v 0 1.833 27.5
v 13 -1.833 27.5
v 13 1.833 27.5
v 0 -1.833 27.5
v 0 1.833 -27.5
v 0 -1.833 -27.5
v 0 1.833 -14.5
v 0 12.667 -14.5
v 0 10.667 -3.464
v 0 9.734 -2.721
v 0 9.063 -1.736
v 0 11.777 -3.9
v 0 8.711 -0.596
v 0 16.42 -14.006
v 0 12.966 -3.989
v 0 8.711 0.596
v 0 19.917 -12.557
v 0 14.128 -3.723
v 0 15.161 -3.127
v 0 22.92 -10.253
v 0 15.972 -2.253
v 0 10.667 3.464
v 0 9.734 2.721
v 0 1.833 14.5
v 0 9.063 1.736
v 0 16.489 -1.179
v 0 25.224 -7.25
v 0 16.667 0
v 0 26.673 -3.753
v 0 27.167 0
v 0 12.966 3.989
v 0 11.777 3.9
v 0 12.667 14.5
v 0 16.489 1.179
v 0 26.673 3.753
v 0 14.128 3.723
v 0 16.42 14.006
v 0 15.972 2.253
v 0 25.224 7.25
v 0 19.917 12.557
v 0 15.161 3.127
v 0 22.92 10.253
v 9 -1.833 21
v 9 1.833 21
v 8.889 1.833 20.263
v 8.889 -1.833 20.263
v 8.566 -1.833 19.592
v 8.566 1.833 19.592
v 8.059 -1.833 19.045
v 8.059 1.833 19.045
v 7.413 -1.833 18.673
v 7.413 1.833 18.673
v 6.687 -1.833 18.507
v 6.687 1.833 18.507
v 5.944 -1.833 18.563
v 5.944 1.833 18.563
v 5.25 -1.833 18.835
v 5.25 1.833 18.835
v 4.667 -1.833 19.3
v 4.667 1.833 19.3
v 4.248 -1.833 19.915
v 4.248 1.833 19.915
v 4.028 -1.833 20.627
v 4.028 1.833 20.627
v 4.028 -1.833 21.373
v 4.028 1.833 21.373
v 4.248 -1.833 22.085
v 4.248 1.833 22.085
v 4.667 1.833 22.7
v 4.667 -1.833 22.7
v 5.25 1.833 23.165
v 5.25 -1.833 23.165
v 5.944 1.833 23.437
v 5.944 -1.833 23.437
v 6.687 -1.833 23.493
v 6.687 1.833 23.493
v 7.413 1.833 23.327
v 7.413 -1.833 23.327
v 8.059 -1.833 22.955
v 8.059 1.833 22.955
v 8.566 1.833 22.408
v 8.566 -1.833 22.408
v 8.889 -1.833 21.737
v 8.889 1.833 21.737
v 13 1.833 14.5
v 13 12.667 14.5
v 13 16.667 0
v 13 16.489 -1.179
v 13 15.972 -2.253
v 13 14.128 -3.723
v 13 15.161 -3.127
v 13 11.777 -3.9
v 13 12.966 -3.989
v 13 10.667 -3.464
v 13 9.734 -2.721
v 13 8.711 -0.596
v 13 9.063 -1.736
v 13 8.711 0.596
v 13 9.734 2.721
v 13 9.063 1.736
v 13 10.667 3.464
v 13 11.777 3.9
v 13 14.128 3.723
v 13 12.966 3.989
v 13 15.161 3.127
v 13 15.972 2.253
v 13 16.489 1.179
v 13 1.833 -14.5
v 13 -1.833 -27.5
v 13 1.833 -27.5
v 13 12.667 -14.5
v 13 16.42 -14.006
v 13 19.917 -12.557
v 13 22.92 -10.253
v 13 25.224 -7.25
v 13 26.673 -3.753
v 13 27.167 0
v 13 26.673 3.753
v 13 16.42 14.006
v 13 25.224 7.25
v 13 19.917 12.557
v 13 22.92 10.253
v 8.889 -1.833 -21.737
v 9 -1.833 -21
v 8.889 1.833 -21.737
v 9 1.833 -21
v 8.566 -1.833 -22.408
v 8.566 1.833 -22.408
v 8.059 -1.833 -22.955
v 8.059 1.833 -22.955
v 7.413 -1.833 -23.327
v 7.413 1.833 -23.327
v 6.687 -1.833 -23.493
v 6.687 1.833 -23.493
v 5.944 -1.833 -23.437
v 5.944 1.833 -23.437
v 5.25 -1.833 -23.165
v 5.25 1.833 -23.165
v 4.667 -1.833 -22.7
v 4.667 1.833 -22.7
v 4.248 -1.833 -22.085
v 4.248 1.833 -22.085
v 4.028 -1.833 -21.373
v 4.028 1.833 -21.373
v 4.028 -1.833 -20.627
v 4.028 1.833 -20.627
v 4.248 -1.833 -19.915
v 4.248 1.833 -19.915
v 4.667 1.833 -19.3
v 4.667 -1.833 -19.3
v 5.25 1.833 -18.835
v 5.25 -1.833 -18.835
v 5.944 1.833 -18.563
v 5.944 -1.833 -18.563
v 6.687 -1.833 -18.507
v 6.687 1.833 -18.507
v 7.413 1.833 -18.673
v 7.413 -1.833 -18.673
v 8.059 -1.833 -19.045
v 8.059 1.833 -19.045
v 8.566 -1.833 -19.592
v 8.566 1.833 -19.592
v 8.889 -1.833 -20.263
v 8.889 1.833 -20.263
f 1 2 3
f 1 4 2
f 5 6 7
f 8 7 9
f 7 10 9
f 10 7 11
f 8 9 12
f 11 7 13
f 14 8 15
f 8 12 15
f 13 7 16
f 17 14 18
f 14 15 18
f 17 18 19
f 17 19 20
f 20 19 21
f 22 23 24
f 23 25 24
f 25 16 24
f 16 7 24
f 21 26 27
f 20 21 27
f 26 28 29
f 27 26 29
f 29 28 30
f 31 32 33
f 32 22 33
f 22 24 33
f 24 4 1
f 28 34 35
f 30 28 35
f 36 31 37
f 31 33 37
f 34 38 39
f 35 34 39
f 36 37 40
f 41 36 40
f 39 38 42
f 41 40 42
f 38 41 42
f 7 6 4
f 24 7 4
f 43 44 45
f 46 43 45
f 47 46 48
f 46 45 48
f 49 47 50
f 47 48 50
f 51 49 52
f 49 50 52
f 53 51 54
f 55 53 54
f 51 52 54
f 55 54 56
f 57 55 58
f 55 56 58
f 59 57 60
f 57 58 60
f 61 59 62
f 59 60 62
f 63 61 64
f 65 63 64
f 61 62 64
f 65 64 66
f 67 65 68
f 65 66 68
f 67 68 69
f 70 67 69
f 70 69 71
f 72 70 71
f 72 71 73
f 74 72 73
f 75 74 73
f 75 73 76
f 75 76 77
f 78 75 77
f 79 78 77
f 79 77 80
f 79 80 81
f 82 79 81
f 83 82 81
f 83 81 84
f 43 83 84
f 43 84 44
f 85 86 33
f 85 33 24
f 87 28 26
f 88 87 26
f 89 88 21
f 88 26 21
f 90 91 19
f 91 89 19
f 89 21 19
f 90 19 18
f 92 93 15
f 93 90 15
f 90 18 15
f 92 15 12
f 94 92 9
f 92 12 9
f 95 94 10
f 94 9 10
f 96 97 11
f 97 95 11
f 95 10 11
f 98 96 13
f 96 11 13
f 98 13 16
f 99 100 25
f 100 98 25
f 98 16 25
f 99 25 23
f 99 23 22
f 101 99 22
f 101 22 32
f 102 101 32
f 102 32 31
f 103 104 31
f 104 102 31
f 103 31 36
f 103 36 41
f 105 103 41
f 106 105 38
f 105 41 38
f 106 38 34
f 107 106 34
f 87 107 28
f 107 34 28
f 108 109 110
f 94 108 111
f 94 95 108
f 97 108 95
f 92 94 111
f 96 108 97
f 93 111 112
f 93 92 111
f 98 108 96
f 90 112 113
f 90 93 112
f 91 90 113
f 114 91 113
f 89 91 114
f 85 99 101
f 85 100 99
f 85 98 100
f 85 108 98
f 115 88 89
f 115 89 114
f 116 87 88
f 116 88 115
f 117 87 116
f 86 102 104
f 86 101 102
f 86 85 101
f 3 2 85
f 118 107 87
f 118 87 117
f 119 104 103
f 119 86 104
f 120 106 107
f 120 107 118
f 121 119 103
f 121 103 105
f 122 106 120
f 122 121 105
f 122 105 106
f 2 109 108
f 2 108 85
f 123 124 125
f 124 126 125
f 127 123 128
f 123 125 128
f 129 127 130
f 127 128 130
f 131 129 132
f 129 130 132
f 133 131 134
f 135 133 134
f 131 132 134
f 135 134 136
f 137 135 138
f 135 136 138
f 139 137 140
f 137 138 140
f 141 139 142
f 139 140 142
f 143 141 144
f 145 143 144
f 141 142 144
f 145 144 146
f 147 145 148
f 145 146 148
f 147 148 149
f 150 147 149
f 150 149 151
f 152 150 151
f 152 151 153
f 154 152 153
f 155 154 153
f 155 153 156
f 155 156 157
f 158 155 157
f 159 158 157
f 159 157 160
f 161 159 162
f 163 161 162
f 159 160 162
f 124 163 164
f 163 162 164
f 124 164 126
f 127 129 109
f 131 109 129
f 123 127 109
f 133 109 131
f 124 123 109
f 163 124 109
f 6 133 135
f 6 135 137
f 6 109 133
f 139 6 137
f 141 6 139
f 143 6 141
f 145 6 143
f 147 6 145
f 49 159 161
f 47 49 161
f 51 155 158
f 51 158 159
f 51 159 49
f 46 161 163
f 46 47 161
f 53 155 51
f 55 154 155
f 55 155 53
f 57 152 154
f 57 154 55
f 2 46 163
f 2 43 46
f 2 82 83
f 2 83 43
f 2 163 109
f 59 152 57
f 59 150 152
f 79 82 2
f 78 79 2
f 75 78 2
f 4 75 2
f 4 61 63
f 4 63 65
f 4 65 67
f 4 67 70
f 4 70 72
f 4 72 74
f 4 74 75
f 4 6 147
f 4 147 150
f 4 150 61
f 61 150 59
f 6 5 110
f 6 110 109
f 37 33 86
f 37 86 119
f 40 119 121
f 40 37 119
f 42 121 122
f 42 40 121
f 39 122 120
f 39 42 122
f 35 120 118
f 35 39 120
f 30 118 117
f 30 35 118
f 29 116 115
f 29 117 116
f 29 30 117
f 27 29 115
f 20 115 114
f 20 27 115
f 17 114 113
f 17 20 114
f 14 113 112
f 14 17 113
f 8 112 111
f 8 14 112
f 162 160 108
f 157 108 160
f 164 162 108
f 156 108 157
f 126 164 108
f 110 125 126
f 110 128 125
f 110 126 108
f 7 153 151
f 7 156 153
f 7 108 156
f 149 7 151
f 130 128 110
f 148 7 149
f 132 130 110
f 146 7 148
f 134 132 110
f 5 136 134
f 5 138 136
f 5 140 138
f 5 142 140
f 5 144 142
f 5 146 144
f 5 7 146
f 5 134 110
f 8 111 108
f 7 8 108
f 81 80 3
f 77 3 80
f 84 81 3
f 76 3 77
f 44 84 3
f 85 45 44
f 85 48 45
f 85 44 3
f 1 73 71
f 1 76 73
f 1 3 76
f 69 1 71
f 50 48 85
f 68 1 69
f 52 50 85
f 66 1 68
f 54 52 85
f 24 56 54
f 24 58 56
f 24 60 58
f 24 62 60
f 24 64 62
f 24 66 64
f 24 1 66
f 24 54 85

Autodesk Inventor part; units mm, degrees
ref_plane "YZ Plane" through (0, 0, 0) normal (1, 0, 0) x (0, 1, 0)
ref_plane "XZ Plane" through (0, 0, 0) normal (0, 1, 0) x (-1, 0, 0)
ref_plane "XY Plane" through (0, 0, 0) normal (0, 0, 1) x (1, 0, 0)
sketch "Sketch1" plane through (0, 0, 0) normal (1, 0, 0) x (0, 1, 0)
  line L0 (-1.8333, 27.5) -> (1.8333, 27.5)
  line L1 (1.8333, -27.5) -> (-1.8333, -27.5)
  line L2 (-1.8333, -27.5) -> (-1.8333, 27.5)
  line L3 (-1.8333, 27.5) -> (1.8333, -27.5) construction
  line L4 (1.8333, 27.5) -> (-1.8333, -27.5) construction
  arc A0 (12.6667, -14.5) -> (12.6667, 14.5) centre (12.6667, 0) ccw
  line L5 (12.6667, 14.5) -> (1.8333, 14.5)
  line L6 (12.6667, -14.5) -> (1.8333, -14.5)
  circle A1 centre (12.6667, 0) radius 4
  line L7 (1.8333, 27.5) -> (1.8333, 14.5)
  line L8 (1.8333, -14.5) -> (1.8333, -27.5)
  point P0 (0, 0)
  dimension "d0" = 55
  dimension "d2" = 8
extrude "Extrusion1" add sketch "Sketch1" along normal blind 13
sketch "Sketch2" plane through (0, 1.8333, 27.5) normal (0, 1, 0) x (1, 0, 0)
  line L0 (13, 13) -> (13, 42) projected
  line L1 (0, 0) -> (13, 13) construction
  line L2 (0, 55) -> (0, 0) projected
  line L3 (0, 42) -> (13, 42) projected
  line L4 (0, 55) -> (13, 42) construction
  circle A0 centre (6.5, 6.5) radius 2.5
  circle A1 centre (6.5, 48.5) radius 2.5
  point P0 (0, 27.5)
  dimension "d5" = 5
  dimension "d6" = 5
extrude "Extrusion2" cut sketch "Sketch2" against normal blind 13
properties part number "bearingStandin" material "Gold"
